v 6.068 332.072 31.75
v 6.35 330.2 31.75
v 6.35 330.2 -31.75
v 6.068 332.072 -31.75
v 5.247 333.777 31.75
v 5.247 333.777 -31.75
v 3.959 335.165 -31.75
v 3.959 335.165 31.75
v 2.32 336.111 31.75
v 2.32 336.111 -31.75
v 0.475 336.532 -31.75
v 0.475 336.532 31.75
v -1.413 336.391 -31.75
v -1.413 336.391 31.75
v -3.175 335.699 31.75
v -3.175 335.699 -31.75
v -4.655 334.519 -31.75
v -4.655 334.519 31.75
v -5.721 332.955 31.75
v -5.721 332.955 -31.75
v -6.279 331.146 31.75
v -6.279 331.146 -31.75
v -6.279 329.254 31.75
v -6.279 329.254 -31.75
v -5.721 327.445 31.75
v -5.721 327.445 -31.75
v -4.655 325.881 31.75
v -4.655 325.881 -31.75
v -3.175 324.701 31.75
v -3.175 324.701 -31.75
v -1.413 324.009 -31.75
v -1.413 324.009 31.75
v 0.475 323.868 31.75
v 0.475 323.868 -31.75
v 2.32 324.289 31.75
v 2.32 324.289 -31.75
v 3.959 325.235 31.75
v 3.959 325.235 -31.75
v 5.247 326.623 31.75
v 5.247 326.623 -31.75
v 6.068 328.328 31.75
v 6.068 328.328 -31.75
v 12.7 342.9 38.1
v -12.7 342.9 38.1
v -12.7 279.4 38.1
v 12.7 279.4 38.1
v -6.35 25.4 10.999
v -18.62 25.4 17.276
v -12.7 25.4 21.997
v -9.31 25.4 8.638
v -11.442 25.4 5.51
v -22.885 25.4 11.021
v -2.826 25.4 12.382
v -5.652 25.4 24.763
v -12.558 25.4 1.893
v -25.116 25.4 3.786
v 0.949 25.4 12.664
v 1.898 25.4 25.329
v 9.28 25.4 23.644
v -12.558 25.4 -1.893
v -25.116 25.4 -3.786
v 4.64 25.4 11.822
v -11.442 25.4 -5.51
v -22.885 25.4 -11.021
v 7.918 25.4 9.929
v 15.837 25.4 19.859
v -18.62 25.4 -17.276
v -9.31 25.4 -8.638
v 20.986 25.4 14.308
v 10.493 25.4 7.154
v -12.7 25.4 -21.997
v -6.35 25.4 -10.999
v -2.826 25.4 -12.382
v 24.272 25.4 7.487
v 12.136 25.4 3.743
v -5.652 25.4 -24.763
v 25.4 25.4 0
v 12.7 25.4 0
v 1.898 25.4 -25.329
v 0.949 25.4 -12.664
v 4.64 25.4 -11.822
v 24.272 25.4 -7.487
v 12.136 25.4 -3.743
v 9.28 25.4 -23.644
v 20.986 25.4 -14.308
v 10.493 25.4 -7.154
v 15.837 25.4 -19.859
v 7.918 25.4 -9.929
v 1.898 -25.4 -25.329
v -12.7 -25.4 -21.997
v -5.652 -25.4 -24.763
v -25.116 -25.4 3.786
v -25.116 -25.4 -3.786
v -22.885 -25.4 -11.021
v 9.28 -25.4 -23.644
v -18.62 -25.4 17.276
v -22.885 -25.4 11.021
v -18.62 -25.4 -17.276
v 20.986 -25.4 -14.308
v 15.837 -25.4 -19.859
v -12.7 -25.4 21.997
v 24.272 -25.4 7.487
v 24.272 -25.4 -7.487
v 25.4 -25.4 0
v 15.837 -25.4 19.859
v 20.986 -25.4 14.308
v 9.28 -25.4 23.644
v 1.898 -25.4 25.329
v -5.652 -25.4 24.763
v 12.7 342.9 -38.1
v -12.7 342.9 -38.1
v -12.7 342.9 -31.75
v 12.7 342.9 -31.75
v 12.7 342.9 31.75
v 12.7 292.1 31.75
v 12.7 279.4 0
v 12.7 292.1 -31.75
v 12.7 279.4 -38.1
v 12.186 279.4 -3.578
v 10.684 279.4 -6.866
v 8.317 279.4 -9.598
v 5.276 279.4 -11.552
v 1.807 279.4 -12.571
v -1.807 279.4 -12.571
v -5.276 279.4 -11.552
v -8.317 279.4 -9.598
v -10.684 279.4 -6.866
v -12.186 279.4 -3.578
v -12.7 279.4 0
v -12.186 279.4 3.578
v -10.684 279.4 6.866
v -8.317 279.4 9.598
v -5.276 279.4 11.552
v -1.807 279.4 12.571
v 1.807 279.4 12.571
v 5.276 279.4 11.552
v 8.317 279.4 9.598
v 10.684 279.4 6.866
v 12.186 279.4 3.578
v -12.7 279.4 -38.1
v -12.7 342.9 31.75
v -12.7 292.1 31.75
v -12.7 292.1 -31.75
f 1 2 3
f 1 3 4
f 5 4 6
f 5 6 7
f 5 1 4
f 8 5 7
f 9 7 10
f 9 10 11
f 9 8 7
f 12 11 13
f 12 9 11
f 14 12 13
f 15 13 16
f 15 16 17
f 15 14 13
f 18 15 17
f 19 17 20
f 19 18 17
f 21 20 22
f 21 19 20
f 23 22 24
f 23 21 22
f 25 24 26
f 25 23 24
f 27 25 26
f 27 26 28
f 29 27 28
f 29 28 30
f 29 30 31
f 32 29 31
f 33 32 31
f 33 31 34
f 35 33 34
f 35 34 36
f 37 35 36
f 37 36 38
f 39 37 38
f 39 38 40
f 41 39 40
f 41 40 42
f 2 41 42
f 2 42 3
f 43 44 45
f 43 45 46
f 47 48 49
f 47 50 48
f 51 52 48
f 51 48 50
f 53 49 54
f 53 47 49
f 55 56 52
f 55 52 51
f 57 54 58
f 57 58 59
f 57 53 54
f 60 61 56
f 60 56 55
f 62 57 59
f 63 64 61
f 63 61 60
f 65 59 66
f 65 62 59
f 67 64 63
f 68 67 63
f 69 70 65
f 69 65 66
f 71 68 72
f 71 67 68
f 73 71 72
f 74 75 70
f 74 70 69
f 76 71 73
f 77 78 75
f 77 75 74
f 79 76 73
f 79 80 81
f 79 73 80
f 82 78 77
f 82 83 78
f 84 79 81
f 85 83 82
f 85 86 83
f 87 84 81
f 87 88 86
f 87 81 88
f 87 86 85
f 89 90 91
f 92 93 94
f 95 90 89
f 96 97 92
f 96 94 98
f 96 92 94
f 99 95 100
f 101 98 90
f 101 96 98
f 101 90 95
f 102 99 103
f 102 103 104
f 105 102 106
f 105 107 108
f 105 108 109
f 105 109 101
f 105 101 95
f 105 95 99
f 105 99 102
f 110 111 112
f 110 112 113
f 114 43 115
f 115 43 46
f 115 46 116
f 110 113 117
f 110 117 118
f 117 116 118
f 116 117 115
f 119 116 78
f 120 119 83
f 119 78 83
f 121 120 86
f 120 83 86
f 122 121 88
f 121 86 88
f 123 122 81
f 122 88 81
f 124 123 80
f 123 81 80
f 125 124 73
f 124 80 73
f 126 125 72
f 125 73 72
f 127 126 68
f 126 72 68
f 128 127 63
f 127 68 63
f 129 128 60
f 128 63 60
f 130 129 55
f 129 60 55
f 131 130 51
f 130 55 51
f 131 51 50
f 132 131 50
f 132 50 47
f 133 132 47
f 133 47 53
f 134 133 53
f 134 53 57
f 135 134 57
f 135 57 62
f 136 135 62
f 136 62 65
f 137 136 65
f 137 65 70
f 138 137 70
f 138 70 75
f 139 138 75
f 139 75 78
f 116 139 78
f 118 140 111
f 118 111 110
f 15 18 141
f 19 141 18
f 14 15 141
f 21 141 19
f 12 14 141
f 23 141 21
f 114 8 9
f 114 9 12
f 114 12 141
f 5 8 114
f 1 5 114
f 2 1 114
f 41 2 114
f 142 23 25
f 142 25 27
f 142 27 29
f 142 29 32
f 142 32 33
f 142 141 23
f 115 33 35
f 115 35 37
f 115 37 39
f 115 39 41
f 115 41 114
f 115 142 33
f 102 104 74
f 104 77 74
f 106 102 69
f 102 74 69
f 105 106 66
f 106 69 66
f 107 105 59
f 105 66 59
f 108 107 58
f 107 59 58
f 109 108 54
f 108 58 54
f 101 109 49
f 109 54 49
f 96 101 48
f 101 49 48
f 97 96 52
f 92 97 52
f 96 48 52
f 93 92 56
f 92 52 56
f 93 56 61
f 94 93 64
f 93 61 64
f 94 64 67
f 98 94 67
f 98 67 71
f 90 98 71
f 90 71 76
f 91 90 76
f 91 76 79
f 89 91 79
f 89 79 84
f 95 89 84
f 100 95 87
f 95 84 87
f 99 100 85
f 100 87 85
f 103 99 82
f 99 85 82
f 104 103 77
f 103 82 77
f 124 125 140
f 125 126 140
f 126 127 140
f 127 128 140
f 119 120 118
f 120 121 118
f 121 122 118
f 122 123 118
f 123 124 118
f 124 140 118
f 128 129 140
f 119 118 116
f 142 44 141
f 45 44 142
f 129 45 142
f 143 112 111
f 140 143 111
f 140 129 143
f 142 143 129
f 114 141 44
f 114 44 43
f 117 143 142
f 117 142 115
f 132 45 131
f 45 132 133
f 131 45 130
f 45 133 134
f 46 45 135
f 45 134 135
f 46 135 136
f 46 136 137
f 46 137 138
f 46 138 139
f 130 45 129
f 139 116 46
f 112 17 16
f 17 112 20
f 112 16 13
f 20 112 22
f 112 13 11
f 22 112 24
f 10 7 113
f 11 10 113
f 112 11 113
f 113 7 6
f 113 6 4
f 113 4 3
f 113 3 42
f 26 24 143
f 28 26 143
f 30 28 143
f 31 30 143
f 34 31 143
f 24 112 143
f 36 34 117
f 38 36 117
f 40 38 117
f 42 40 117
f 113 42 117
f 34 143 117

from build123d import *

# Parameters (mm, degrees)
SKETCH2_R           = 25.4
BOSS_EXTRUDE1_DEPTH = 25.4
SKETCH3_R           = 12.7
BOSS_EXTRUDE2_DEPTH = 254
SKETCH4_W           = 25.4
SKETCH4_H           = 76.2
BOSS_EXTRUDE3_DEPTH = 12.7
SKETCH5_W           = 25.4
SKETCH5_H           = 6.35
BOSS_EXTRUDE4_DEPTH = 50.8
SKETCH6_R           = 6.35
BOSS_EXTRUDE5_DEPTH = 69.85
SKETCH7_R           = 25.4
BOSS_EXTRUDE6_DEPTH = 25.4


with BuildPart() as part:
    # Sketch2 → Boss-Extrude1 (new body)
    with BuildSketch(Plane(origin=(0, 0, 0), x_dir=(1, 0, 0), z_dir=(0, 1, 0))):
        Circle(SKETCH2_R)
    extrude(amount=BOSS_EXTRUDE1_DEPTH)

    # Sketch3 → Boss-Extrude2 (add)
    with BuildSketch(Plane(origin=(0, 25.4, 0), x_dir=(1, 0, 0), z_dir=(0, 1, 0))):
        Circle(SKETCH3_R)
    extrude(amount=BOSS_EXTRUDE2_DEPTH)

    # Sketch4 → Boss-Extrude3 (add)
    with BuildSketch(Plane(origin=(0, 279.4, 0), x_dir=(1, 0, 0), z_dir=(0, 1, 0))):
        Rectangle(SKETCH4_W, SKETCH4_H)
    extrude(amount=BOSS_EXTRUDE3_DEPTH)

    # Sketch5 → Boss-Extrude4 (add)
    with BuildSketch(Plane(origin=(0, 292.1, 0), x_dir=(1, 0, 0), z_dir=(0, 1, 0))):
        with Locations((0, 34.925)):
            Rectangle(SKETCH5_W, SKETCH5_H)
        with Locations((0, -34.925)):
            Rectangle(SKETCH5_W, SKETCH5_H)
    extrude(amount=BOSS_EXTRUDE4_DEPTH)

    # Sketch6 → Boss-Extrude5 (add)
    with BuildSketch(Plane.XY.offset(38.1)):
        with Locations((0, 330.2)):
            Circle(SKETCH6_R)
    extrude(amount=-BOSS_EXTRUDE5_DEPTH)

    # Sketch7 → Boss-Extrude6 (add)
    with BuildSketch(Plane.XZ):
        Circle(SKETCH7_R)
    extrude(amount=BOSS_EXTRUDE6_DEPTH)


solid = part.part
